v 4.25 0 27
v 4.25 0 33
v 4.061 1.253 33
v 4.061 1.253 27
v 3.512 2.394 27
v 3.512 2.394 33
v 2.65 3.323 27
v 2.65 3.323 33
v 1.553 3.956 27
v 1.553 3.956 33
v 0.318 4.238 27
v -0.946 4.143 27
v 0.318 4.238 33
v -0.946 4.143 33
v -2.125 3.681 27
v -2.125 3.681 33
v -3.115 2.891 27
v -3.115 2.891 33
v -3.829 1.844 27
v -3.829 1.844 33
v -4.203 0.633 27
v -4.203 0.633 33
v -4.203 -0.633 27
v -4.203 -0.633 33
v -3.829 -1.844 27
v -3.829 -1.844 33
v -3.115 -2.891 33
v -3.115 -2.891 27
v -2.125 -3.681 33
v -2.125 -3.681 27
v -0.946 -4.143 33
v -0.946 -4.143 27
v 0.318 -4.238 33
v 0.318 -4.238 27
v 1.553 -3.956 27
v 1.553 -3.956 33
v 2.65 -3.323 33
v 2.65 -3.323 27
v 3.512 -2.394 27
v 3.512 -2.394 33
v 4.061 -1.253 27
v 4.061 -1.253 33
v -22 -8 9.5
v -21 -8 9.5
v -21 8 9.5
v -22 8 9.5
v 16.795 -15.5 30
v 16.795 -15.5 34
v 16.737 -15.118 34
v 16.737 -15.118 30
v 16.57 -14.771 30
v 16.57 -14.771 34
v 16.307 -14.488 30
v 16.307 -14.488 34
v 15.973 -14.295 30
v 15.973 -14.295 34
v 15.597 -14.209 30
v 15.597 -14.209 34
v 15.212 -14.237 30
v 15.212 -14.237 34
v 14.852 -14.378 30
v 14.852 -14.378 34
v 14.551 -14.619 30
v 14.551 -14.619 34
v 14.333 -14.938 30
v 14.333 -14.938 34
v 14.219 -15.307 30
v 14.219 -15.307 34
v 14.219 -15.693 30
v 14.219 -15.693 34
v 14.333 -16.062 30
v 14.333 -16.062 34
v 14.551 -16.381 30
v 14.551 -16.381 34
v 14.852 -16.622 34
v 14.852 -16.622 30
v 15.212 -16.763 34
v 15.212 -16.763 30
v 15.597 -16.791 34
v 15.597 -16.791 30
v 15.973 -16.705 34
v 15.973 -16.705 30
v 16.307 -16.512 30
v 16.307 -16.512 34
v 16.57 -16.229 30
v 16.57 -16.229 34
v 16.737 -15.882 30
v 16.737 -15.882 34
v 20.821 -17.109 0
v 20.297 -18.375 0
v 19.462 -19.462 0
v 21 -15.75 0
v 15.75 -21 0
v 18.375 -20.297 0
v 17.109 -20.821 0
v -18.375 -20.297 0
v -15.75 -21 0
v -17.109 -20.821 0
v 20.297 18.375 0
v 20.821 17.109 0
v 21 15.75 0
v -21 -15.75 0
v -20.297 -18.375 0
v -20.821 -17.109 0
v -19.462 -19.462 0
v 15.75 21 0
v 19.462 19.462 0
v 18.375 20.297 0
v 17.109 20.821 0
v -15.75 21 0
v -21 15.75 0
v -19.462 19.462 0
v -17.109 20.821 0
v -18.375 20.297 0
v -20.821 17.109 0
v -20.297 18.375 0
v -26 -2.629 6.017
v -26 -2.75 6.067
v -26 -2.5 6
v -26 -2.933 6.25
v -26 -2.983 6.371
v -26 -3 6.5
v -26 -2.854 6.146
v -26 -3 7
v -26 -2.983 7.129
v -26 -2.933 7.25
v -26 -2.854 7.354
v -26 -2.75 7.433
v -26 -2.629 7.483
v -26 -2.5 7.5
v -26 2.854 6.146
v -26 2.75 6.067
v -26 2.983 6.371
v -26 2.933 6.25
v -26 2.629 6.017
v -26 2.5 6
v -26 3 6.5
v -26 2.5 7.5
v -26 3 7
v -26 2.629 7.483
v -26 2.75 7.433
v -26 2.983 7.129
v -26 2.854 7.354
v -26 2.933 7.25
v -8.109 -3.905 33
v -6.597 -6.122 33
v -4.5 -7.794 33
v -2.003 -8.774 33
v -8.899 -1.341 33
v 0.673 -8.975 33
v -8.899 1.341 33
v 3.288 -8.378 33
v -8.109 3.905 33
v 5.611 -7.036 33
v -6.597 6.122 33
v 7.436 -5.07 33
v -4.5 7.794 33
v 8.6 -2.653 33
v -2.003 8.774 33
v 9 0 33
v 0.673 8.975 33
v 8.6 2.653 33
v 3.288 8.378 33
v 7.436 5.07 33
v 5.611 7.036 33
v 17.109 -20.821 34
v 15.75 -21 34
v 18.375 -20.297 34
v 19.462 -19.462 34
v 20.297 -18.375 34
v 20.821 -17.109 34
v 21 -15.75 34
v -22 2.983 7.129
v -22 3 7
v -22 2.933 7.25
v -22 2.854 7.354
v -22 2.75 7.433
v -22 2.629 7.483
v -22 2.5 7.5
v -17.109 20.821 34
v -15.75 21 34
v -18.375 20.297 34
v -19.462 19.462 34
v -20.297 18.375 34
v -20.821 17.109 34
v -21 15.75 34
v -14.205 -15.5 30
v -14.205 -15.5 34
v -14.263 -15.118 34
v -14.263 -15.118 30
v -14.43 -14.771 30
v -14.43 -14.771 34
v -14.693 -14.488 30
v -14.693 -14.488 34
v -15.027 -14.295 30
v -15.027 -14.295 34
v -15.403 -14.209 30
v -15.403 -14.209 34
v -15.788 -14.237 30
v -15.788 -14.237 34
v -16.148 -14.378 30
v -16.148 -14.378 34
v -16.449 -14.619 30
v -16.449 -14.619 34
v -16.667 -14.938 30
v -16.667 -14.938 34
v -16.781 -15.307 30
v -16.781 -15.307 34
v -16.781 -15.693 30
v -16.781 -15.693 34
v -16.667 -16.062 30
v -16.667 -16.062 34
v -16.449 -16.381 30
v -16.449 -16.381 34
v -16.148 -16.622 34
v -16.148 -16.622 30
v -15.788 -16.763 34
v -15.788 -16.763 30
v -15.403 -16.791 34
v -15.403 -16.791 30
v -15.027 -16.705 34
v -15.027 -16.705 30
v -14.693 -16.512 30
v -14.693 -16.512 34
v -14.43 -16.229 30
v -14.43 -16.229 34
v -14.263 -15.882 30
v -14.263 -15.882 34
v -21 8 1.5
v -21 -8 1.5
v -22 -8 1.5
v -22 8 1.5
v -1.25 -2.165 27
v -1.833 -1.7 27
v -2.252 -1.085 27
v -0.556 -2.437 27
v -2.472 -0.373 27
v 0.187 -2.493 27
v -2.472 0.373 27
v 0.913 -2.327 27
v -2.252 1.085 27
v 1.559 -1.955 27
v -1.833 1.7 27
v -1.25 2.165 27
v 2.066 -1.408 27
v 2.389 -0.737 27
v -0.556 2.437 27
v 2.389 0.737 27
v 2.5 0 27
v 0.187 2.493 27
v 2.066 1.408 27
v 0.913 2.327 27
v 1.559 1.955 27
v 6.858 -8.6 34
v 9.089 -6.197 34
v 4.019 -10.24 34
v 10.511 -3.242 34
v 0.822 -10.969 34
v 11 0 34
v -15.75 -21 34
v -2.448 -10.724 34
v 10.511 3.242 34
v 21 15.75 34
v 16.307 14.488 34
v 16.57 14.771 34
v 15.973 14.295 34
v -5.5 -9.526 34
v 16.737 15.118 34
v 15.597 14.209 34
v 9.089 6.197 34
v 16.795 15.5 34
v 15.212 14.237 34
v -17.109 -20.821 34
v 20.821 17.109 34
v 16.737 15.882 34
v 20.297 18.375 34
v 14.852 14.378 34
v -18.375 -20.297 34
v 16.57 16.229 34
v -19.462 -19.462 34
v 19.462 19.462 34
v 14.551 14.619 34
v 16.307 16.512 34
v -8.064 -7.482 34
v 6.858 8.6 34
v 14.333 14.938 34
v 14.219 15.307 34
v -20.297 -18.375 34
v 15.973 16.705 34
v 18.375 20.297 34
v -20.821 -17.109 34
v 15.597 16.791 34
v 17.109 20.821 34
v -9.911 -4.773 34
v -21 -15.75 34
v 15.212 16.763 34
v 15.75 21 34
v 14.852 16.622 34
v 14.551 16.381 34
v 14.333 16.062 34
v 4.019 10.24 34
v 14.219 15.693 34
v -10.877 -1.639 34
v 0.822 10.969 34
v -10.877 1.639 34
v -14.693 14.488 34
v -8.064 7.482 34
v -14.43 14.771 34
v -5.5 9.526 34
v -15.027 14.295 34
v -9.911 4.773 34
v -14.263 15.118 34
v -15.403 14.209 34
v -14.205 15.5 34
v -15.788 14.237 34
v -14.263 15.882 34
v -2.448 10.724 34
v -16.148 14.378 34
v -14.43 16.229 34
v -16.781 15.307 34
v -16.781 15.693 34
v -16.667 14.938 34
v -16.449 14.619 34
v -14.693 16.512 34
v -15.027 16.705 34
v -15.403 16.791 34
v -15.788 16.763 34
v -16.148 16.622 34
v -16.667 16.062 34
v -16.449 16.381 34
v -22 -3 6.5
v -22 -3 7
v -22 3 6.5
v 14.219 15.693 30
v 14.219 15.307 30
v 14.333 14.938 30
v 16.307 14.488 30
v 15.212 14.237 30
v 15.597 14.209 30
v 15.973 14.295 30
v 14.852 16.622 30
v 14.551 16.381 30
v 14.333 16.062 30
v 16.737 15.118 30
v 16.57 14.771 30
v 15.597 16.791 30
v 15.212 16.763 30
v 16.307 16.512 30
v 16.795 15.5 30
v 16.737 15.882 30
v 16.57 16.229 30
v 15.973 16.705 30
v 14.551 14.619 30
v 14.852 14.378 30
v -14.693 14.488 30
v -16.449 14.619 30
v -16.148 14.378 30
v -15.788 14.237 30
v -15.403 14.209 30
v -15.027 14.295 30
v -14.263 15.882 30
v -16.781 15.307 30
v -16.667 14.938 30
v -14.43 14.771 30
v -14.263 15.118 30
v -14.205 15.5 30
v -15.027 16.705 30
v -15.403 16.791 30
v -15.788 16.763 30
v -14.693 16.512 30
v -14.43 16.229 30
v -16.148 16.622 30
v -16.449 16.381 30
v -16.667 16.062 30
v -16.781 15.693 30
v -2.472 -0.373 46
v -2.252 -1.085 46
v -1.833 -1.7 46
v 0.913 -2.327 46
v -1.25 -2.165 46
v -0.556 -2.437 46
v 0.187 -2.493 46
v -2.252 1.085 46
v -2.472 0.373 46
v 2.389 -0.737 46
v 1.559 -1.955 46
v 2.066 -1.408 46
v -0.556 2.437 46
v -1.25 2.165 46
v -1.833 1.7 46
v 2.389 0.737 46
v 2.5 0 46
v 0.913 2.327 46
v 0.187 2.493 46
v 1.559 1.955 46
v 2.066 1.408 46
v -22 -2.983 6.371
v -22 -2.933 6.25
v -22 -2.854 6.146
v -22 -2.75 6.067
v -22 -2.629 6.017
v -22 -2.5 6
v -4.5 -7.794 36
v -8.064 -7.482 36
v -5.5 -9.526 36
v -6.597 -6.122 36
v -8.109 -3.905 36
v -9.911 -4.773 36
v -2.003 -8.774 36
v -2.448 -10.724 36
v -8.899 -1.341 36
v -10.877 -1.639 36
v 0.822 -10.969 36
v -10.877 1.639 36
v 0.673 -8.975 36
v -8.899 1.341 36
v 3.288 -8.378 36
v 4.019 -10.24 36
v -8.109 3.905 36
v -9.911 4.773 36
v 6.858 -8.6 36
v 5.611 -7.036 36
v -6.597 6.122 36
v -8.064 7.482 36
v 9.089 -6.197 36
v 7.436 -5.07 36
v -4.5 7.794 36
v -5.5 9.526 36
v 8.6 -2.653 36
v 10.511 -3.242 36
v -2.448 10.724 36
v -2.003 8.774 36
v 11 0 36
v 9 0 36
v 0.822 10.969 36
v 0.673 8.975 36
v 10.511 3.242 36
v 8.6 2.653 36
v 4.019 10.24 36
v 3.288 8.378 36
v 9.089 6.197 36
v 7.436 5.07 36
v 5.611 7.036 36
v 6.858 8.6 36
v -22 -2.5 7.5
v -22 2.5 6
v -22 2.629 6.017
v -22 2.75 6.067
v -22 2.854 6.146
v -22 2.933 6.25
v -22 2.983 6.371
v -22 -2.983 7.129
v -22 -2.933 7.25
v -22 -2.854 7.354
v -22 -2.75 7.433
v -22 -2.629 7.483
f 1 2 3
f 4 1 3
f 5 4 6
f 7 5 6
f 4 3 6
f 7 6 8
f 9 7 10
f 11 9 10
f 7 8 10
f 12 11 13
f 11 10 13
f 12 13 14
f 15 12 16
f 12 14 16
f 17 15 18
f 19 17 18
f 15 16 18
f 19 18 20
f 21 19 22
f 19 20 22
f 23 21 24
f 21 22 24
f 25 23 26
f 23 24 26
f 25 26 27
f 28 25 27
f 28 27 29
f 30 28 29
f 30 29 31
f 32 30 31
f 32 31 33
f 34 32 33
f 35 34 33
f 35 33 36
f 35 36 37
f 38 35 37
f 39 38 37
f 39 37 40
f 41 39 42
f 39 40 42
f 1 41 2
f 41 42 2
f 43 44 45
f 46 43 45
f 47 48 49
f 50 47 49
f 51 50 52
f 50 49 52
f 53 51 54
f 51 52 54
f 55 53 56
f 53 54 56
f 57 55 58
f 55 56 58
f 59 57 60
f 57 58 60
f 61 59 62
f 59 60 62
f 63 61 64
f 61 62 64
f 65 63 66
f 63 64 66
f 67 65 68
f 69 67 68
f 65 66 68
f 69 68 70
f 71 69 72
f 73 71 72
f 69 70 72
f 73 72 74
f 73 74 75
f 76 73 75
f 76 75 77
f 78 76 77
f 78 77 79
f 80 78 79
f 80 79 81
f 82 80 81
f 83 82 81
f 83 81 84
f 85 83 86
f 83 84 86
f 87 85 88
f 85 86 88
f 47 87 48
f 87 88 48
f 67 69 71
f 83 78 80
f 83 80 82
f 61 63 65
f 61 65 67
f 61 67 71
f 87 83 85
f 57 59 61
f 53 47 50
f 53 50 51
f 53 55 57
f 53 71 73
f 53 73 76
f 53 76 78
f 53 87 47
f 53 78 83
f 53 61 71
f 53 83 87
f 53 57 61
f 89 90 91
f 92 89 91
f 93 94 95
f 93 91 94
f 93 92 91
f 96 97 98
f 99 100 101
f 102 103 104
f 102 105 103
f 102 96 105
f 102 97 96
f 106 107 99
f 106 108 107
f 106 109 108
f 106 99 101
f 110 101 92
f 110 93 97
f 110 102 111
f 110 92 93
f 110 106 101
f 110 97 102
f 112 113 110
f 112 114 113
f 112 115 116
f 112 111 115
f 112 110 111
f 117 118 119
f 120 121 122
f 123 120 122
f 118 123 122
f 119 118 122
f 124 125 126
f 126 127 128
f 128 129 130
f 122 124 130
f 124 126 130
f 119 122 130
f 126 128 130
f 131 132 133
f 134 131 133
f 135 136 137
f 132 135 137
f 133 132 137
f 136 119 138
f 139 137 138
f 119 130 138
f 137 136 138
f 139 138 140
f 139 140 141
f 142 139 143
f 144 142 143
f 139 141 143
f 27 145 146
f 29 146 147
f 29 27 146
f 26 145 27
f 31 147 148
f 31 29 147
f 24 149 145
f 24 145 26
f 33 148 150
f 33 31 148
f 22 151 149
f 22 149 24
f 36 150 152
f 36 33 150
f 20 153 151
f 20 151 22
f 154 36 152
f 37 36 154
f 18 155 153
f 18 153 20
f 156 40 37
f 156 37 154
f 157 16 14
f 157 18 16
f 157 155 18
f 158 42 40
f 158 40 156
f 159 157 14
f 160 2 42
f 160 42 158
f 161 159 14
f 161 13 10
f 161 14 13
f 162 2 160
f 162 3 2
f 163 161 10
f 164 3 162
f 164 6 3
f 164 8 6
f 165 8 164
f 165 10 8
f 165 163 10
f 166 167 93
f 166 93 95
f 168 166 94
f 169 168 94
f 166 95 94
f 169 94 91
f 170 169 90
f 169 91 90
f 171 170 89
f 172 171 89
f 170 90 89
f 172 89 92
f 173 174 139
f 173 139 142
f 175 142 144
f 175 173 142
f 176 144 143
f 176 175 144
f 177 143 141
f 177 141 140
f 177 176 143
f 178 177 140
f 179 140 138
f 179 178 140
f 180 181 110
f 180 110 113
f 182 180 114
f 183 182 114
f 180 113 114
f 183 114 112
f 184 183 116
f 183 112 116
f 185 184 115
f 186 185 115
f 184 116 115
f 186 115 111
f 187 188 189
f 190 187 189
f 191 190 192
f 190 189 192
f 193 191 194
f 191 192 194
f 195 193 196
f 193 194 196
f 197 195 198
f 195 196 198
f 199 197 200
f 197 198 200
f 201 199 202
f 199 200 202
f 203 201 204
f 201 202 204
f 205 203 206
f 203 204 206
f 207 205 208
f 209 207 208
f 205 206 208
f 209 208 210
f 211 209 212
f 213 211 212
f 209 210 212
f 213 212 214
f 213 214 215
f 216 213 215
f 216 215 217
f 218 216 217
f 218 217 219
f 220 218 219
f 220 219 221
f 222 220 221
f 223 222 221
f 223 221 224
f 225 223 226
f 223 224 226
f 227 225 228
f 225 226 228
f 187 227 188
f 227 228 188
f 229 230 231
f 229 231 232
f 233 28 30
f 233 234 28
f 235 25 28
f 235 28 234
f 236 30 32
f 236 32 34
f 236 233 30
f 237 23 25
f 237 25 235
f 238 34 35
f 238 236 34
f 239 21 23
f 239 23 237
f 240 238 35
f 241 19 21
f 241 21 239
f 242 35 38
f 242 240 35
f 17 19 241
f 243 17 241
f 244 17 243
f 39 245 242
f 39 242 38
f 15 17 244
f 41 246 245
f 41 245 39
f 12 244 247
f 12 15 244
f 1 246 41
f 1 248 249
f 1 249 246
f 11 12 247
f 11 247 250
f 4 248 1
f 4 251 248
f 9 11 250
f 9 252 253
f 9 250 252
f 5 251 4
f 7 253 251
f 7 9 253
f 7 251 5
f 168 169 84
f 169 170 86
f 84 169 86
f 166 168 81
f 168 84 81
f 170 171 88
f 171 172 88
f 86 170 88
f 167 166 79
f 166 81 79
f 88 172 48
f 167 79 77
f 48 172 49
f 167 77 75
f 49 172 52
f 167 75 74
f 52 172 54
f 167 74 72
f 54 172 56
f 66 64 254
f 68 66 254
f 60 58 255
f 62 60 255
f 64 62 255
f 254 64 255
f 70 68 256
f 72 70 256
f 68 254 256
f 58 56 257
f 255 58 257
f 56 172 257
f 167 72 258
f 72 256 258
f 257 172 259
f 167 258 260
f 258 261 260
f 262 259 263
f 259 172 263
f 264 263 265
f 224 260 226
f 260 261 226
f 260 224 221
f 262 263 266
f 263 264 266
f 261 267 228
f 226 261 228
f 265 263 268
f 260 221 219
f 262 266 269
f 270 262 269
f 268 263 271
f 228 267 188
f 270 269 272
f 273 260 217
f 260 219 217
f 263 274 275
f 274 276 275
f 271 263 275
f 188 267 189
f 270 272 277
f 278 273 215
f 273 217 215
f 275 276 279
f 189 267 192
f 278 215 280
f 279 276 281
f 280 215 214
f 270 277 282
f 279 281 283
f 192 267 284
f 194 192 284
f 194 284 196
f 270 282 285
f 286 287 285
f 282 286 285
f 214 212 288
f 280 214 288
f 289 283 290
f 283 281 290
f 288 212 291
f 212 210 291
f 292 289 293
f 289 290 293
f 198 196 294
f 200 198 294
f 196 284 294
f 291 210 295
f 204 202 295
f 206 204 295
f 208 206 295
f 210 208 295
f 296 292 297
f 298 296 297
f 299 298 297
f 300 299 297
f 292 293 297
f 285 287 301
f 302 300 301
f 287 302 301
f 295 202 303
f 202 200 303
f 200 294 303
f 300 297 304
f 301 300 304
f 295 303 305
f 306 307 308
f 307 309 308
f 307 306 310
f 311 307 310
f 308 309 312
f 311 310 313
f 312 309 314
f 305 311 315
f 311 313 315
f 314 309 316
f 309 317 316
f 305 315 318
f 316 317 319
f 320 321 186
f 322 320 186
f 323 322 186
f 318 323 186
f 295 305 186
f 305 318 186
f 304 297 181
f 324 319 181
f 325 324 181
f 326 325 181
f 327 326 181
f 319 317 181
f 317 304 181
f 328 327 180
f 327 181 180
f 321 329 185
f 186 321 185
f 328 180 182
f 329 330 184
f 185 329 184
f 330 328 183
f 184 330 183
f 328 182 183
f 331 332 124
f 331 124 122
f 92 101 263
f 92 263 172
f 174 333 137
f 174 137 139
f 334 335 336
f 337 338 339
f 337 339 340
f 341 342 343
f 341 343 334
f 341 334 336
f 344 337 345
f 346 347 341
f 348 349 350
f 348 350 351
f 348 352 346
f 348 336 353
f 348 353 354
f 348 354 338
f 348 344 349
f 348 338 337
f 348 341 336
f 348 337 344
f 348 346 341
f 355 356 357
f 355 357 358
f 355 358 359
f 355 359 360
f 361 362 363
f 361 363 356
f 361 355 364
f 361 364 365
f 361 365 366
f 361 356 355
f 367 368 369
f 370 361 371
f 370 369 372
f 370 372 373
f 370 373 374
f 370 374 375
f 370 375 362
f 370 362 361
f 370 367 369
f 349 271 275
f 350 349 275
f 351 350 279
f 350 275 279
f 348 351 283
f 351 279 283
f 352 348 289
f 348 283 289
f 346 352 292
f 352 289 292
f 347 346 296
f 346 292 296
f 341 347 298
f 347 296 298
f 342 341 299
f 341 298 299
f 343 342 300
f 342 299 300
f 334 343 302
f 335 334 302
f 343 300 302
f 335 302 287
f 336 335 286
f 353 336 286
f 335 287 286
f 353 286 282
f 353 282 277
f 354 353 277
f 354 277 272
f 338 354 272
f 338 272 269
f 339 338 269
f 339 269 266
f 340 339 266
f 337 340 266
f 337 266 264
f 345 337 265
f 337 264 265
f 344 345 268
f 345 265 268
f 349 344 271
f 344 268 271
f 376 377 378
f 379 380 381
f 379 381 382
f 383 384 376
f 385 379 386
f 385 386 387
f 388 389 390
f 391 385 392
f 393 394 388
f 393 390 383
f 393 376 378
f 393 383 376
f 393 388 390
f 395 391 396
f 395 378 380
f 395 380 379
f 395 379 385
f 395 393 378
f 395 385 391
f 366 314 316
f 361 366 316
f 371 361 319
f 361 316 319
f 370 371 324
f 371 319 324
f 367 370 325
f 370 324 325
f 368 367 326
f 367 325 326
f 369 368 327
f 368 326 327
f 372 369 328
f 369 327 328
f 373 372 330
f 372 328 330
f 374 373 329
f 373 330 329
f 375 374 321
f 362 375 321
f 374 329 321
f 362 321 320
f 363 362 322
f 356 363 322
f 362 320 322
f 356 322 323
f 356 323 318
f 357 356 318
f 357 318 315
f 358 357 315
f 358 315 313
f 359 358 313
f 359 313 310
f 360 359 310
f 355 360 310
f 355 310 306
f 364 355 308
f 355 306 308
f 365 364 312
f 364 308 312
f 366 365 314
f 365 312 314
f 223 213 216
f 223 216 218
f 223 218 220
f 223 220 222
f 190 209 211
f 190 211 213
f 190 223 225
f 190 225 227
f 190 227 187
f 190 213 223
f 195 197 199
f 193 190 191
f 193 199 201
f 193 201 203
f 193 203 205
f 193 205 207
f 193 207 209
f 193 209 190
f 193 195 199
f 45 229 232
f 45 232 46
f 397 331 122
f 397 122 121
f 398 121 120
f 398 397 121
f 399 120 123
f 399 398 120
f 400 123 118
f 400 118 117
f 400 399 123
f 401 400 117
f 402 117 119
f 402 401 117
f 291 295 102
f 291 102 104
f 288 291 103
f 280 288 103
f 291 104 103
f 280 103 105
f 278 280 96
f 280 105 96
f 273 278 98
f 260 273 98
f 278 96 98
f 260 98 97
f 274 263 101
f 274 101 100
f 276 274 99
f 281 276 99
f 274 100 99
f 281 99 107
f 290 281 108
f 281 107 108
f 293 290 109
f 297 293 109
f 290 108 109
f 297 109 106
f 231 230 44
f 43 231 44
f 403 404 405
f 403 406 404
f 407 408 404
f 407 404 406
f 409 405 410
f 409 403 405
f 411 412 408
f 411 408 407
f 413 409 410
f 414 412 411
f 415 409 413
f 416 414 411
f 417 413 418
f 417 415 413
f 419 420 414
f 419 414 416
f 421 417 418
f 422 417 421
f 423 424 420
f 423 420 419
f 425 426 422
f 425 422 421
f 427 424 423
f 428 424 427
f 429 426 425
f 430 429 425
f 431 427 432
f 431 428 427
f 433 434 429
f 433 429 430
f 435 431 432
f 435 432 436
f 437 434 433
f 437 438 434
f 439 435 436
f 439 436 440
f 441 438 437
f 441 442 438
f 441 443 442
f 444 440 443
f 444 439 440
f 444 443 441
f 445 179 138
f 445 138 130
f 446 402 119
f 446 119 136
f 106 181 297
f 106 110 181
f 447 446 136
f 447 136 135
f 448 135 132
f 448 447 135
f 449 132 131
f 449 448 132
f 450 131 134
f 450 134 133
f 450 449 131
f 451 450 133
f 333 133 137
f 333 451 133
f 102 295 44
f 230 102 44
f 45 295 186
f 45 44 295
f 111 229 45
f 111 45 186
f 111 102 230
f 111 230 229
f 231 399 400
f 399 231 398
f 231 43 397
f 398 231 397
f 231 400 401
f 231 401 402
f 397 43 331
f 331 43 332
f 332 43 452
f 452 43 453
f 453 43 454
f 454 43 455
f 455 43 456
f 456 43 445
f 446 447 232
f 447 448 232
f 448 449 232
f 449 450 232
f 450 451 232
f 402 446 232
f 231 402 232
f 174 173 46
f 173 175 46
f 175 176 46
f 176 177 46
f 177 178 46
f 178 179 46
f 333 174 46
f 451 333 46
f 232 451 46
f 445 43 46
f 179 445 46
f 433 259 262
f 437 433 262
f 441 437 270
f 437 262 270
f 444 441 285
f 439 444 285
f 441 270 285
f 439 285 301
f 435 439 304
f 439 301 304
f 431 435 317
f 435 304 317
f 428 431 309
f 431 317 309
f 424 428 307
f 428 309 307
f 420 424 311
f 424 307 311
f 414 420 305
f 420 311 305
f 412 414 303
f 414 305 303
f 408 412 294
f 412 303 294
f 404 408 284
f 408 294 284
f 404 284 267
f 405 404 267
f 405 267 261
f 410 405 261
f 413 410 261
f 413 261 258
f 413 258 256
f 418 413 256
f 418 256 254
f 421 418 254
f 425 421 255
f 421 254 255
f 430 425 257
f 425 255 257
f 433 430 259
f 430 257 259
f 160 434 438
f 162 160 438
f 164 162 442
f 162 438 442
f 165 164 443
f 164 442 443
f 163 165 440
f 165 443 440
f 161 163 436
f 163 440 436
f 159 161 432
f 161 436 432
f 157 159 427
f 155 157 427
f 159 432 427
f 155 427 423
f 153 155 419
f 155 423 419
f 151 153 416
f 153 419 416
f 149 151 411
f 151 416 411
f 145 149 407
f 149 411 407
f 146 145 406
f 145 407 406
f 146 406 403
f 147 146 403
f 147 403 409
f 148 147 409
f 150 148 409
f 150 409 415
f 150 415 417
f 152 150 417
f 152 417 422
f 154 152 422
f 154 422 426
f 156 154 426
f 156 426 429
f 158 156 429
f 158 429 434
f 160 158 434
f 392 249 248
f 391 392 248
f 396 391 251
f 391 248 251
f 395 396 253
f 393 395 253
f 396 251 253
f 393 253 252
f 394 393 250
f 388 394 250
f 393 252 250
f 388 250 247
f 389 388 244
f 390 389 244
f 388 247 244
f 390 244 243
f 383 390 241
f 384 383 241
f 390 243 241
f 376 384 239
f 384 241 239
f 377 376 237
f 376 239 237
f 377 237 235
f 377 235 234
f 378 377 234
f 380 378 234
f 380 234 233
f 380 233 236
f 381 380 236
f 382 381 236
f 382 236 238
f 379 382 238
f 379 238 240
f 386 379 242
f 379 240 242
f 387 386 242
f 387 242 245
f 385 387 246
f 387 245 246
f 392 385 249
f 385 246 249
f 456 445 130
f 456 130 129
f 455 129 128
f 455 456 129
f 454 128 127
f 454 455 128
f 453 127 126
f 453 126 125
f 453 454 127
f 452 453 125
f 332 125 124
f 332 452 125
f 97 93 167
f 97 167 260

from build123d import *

# Parameters (mm, degrees)
PAD007_DEPTH    = 4
SKETCH010_W     = 16
SKETCH010_H     = 8
PAD006_DEPTH    = 1
SKETCH008_R     = 2.5
PAD004_DEPTH    = 19
SKETCH006_R     = 11
PAD003_DEPTH    = 2
SKETCH007_R     = 9
POCKET003_DEPTH = 2
PAD002_DEPTH    = 7.5
SKETCH003_R     = 9
POCKET_DEPTH    = 1
SKETCH004_R     = 4.25
POCKET001_DEPTH = 6
SKETCH005_R     = 1.295
POCKET002_DEPTH = 4
PAD001_DEPTH    = 17
PAD_DEPTH       = 9.5


with BuildPart() as pad007:
    # Sketch011 → Pad007 (new body)
    with BuildSketch(Plane.YZ.offset(-22)):
        with BuildLine():
            Line((2.5, 7.5), (-2.5, 7.5))
            ThreePointArc((-2.5, 7.5), (-2.853553, 7.353553), (-3, 7))
            Line((-3, 7), (-3, 6.5))
            ThreePointArc((-3, 6.5), (-2.853553, 6.146447), (-2.5, 6))
            Line((-2.5, 6), (2.5, 6))
            ThreePointArc((2.5, 6), (2.853553, 6.146447), (3, 6.5))
            Line((3, 6.5), (3, 7))
            ThreePointArc((3, 7), (2.853553, 7.353553), (2.5, 7.5))
        make_face()
    extrude(amount=-PAD007_DEPTH)


with BuildPart() as pad006:
    # Sketch010 → Pad006 (new body)
    with BuildSketch(Plane.YZ.offset(-21)):
        with Locations((0, 5.5)):
            Rectangle(SKETCH010_W, SKETCH010_H)
    extrude(amount=-PAD006_DEPTH)


with BuildPart() as pad004:
    # Sketch008 → Pad004 (new body)
    with BuildSketch(Plane.XY.offset(27)):
        Circle(SKETCH008_R)
    extrude(amount=PAD004_DEPTH)


with BuildPart() as fusion001:
    # Sketch006 → Pad003 (new body)
    with BuildSketch(Plane.XY.offset(34)):
        Circle(SKETCH006_R)
    extrude(amount=PAD003_DEPTH)

    # Sketch007 → Pocket003 (cut)
    with BuildSketch(Plane.XY.offset(36)):
        Circle(SKETCH007_R)
    extrude(amount=-POCKET003_DEPTH, mode=Mode.SUBTRACT)

    # Fusion001: union Pad004
    add(pad004.part)


with BuildPart() as f_6mm:
    # Sketch002 → Pad002 (new body)
    with BuildSketch(Plane.XY.offset(26.5)):
        with BuildLine():
            Line((-15.75, 21), (15.75, 21))
            ThreePointArc((21, 15.75), (19.462311, 19.462311), (15.75, 21))
            Line((21, 15.75), (21, -15.75))
            ThreePointArc((15.75, -21), (19.462311, -19.462311), (21, -15.75))
            Line((15.75, -21), (-15.75, -21))
            ThreePointArc((-21, -15.75), (-19.462311, -19.462311), (-15.75, -21))
            Line((-21, -15.75), (-21, 15.75))
            ThreePointArc((-15.75, 21), (-19.462311, 19.462311), (-21, 15.75))
        make_face()
    extrude(amount=PAD002_DEPTH)

    # Sketch003 → Pocket (cut)
    with BuildSketch(Plane.XY.offset(34)):
        Circle(SKETCH003_R)
    extrude(amount=-POCKET_DEPTH, mode=Mode.SUBTRACT)

    # Sketch004 → Pocket001 (cut)
    with BuildSketch(Plane.XY.offset(33)):
        Circle(SKETCH004_R)
    extrude(amount=-POCKET001_DEPTH, mode=Mode.SUBTRACT)


with BuildPart() as m3:
    # Pocket002 base: copy of 上面6mm深
    add(f_6mm.part)

    # Sketch005 → Pocket002 (cut)
    with BuildSketch(Plane.XY.offset(34)):
        with Locations((15.5, 15.5)):
            Circle(SKETCH005_R)
        with Locations((-15.5, 15.5)):
            Circle(SKETCH005_R)
        with Locations((-15.5, -15.5)):
            Circle(SKETCH005_R)
        with Locations((15.5, -15.5)):
            Circle(SKETCH005_R)
    extrude(amount=-POCKET002_DEPTH, mode=Mode.SUBTRACT)


with BuildPart() as fusion002:
    # Common base: copy of 上面6mm深
    add(f_6mm.part)

    # Common: intersect M3ネジ穴
    add(m3.part, mode=Mode.INTERSECT)

    # Fusion002: union Fusion001
    add(fusion001.part)


with BuildPart() as pad001:
    # Sketch001 → Pad001 (new body)
    with BuildSketch(Plane.XY.offset(9.5)):
        with BuildLine():
            Line((-15.75, 21), (15.75, 21))
            ThreePointArc((21, 15.75), (19.462311, 19.462311), (15.75, 21))
            Line((21, 15.75), (21, -15.75))
            ThreePointArc((15.75, -21), (19.462311, -19.462311), (21, -15.75))
            Line((15.75, -21), (-15.75, -21))
            ThreePointArc((-21, -15.75), (-19.462311, -19.462311), (-15.75, -21))
            Line((-21, -15.75), (-21, 15.75))
            ThreePointArc((-15.75, 21), (-19.462311, 19.462311), (-21, 15.75))
        make_face()
    extrude(amount=PAD001_DEPTH)


with BuildPart() as fusion005:
    # Sketch → Pad (new body)
    with BuildSketch(Plane.XY):
        with BuildLine():
            Line((-15.75, 21), (15.75, 21))
            ThreePointArc((21, 15.75), (19.462311, 19.462311), (15.75, 21))
            Line((21, 15.75), (21, -15.75))
            ThreePointArc((15.75, -21), (19.462311, -19.462311), (21, -15.75))
            Line((15.75, -21), (-15.75, -21))
            ThreePointArc((-21, -15.75), (-19.462311, -19.462311), (-15.75, -21))
            Line((-21, -15.75), (-21, 15.75))
            ThreePointArc((-15.75, 21), (-19.462311, 19.462311), (-21, 15.75))
        make_face()
    extrude(amount=PAD_DEPTH)

    # Fusion: union Pad001
    add(pad001.part)

    # Fusion003: union Fusion002
    add(fusion002.part)

    # Fusion004: union Pad006
    add(pad006.part)

    # Fusion005: union Pad007
    add(pad007.part)


solid = fusion005.part
